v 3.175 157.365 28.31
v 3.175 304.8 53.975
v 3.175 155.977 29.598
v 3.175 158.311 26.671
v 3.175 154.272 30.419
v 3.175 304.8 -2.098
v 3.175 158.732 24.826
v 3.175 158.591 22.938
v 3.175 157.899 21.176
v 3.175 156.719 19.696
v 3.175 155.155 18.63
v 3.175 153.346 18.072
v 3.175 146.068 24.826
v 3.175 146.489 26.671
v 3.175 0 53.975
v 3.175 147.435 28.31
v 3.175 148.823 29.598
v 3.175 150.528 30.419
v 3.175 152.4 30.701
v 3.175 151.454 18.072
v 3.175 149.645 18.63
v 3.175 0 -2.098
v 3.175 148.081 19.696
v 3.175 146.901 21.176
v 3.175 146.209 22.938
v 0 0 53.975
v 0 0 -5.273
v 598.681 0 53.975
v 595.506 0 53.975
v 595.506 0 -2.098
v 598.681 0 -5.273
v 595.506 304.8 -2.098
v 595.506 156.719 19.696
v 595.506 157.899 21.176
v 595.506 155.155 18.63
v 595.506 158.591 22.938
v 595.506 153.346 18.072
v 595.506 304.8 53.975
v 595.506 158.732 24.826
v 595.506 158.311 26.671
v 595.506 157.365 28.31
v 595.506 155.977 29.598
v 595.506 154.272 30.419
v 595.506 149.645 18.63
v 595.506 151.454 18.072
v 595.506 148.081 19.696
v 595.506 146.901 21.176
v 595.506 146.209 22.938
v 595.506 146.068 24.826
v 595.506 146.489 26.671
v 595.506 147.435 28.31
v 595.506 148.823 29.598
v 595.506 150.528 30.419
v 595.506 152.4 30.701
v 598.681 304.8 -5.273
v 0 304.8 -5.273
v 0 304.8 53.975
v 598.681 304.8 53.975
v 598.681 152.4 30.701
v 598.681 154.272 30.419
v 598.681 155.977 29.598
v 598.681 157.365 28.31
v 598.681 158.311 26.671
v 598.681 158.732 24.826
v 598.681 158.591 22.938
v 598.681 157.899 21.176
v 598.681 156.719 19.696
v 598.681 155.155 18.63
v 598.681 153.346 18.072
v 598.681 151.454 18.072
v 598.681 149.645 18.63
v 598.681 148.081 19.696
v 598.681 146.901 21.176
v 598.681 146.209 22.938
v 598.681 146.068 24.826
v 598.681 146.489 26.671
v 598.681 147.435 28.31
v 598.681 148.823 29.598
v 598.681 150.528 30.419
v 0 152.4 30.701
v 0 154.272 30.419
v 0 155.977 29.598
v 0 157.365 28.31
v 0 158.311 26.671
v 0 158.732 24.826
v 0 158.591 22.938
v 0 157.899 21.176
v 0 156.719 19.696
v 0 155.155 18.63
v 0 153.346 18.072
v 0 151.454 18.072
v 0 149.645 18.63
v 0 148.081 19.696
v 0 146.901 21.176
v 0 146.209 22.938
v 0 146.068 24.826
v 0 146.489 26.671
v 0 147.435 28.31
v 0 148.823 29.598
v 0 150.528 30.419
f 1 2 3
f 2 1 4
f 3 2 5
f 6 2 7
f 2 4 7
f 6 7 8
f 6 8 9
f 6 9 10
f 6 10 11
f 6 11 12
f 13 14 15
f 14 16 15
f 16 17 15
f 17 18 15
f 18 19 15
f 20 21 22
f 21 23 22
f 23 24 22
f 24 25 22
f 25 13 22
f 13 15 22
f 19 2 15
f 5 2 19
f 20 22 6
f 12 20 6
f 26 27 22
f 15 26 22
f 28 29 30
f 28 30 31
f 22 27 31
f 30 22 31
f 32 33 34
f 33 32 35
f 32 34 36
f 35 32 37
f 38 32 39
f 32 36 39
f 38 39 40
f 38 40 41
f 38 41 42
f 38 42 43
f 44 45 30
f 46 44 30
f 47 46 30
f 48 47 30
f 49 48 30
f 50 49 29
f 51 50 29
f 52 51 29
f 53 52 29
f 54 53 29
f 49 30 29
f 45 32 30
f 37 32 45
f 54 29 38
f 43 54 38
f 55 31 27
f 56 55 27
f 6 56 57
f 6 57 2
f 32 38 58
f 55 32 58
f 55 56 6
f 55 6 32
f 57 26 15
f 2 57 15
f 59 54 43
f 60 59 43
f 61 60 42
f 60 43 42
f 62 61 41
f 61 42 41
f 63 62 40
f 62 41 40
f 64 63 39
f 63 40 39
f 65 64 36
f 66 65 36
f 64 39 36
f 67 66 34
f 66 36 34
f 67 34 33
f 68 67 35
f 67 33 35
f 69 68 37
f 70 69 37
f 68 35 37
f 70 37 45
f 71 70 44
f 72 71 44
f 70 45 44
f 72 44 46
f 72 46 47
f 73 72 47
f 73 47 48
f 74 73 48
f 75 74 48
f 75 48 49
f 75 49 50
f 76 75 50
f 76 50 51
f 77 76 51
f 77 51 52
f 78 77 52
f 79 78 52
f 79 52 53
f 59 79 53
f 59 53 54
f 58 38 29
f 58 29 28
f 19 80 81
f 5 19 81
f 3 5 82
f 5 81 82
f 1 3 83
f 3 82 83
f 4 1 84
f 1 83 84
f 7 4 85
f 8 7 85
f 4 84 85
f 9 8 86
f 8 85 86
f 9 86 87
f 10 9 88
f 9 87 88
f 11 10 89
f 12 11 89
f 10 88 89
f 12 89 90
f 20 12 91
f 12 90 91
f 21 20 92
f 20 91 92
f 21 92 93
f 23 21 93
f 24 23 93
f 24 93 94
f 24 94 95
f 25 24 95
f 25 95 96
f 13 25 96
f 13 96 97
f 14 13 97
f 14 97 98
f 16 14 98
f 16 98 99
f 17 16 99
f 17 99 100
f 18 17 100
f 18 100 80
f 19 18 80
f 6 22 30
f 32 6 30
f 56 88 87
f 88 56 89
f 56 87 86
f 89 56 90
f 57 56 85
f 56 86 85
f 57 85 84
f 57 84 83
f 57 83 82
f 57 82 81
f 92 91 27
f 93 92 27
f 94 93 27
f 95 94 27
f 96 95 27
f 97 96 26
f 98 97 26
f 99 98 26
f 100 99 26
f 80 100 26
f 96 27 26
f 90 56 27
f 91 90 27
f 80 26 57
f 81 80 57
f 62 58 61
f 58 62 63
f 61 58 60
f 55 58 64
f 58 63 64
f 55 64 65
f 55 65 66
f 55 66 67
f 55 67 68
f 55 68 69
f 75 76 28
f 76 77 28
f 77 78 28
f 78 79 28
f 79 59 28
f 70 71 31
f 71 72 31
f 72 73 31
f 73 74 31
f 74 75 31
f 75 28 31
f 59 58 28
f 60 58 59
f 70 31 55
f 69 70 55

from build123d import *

# Parameters (mm, degrees)
BOSS_EXTRUDE1_DEPTH = 304.8
SKETCH2_R           = 6.35
CUT_EXTRUDE1_DEPTH  = 599.68125614


with BuildPart() as part:
    # Sketch1 → Boss-Extrude1 (new body)
    with BuildSketch(Plane(origin=(0, 0, 0), x_dir=(1, 0, 0), z_dir=(0, 1, 0))):
        Polygon((3.175, 2.097530582), (595.50625614, 2.097530582), (595.50625614, -53.975), (598.68125614, -53.975), (598.68125614, 0), (598.68125614, 5.272530582), (0, 5.272530582), (0, 0), (0, -53.975), (3.175, -53.975), align=None)
    extrude(amount=BOSS_EXTRUDE1_DEPTH)

    # Sketch2 → Cut-Extrude1 (cut, through all)
    with BuildSketch(Plane.ZY):
        with Locations((24.351234709, 152.4)):
            Circle(SKETCH2_R)
    extrude(amount=-CUT_EXTRUDE1_DEPTH, mode=Mode.SUBTRACT)


solid = part.part
